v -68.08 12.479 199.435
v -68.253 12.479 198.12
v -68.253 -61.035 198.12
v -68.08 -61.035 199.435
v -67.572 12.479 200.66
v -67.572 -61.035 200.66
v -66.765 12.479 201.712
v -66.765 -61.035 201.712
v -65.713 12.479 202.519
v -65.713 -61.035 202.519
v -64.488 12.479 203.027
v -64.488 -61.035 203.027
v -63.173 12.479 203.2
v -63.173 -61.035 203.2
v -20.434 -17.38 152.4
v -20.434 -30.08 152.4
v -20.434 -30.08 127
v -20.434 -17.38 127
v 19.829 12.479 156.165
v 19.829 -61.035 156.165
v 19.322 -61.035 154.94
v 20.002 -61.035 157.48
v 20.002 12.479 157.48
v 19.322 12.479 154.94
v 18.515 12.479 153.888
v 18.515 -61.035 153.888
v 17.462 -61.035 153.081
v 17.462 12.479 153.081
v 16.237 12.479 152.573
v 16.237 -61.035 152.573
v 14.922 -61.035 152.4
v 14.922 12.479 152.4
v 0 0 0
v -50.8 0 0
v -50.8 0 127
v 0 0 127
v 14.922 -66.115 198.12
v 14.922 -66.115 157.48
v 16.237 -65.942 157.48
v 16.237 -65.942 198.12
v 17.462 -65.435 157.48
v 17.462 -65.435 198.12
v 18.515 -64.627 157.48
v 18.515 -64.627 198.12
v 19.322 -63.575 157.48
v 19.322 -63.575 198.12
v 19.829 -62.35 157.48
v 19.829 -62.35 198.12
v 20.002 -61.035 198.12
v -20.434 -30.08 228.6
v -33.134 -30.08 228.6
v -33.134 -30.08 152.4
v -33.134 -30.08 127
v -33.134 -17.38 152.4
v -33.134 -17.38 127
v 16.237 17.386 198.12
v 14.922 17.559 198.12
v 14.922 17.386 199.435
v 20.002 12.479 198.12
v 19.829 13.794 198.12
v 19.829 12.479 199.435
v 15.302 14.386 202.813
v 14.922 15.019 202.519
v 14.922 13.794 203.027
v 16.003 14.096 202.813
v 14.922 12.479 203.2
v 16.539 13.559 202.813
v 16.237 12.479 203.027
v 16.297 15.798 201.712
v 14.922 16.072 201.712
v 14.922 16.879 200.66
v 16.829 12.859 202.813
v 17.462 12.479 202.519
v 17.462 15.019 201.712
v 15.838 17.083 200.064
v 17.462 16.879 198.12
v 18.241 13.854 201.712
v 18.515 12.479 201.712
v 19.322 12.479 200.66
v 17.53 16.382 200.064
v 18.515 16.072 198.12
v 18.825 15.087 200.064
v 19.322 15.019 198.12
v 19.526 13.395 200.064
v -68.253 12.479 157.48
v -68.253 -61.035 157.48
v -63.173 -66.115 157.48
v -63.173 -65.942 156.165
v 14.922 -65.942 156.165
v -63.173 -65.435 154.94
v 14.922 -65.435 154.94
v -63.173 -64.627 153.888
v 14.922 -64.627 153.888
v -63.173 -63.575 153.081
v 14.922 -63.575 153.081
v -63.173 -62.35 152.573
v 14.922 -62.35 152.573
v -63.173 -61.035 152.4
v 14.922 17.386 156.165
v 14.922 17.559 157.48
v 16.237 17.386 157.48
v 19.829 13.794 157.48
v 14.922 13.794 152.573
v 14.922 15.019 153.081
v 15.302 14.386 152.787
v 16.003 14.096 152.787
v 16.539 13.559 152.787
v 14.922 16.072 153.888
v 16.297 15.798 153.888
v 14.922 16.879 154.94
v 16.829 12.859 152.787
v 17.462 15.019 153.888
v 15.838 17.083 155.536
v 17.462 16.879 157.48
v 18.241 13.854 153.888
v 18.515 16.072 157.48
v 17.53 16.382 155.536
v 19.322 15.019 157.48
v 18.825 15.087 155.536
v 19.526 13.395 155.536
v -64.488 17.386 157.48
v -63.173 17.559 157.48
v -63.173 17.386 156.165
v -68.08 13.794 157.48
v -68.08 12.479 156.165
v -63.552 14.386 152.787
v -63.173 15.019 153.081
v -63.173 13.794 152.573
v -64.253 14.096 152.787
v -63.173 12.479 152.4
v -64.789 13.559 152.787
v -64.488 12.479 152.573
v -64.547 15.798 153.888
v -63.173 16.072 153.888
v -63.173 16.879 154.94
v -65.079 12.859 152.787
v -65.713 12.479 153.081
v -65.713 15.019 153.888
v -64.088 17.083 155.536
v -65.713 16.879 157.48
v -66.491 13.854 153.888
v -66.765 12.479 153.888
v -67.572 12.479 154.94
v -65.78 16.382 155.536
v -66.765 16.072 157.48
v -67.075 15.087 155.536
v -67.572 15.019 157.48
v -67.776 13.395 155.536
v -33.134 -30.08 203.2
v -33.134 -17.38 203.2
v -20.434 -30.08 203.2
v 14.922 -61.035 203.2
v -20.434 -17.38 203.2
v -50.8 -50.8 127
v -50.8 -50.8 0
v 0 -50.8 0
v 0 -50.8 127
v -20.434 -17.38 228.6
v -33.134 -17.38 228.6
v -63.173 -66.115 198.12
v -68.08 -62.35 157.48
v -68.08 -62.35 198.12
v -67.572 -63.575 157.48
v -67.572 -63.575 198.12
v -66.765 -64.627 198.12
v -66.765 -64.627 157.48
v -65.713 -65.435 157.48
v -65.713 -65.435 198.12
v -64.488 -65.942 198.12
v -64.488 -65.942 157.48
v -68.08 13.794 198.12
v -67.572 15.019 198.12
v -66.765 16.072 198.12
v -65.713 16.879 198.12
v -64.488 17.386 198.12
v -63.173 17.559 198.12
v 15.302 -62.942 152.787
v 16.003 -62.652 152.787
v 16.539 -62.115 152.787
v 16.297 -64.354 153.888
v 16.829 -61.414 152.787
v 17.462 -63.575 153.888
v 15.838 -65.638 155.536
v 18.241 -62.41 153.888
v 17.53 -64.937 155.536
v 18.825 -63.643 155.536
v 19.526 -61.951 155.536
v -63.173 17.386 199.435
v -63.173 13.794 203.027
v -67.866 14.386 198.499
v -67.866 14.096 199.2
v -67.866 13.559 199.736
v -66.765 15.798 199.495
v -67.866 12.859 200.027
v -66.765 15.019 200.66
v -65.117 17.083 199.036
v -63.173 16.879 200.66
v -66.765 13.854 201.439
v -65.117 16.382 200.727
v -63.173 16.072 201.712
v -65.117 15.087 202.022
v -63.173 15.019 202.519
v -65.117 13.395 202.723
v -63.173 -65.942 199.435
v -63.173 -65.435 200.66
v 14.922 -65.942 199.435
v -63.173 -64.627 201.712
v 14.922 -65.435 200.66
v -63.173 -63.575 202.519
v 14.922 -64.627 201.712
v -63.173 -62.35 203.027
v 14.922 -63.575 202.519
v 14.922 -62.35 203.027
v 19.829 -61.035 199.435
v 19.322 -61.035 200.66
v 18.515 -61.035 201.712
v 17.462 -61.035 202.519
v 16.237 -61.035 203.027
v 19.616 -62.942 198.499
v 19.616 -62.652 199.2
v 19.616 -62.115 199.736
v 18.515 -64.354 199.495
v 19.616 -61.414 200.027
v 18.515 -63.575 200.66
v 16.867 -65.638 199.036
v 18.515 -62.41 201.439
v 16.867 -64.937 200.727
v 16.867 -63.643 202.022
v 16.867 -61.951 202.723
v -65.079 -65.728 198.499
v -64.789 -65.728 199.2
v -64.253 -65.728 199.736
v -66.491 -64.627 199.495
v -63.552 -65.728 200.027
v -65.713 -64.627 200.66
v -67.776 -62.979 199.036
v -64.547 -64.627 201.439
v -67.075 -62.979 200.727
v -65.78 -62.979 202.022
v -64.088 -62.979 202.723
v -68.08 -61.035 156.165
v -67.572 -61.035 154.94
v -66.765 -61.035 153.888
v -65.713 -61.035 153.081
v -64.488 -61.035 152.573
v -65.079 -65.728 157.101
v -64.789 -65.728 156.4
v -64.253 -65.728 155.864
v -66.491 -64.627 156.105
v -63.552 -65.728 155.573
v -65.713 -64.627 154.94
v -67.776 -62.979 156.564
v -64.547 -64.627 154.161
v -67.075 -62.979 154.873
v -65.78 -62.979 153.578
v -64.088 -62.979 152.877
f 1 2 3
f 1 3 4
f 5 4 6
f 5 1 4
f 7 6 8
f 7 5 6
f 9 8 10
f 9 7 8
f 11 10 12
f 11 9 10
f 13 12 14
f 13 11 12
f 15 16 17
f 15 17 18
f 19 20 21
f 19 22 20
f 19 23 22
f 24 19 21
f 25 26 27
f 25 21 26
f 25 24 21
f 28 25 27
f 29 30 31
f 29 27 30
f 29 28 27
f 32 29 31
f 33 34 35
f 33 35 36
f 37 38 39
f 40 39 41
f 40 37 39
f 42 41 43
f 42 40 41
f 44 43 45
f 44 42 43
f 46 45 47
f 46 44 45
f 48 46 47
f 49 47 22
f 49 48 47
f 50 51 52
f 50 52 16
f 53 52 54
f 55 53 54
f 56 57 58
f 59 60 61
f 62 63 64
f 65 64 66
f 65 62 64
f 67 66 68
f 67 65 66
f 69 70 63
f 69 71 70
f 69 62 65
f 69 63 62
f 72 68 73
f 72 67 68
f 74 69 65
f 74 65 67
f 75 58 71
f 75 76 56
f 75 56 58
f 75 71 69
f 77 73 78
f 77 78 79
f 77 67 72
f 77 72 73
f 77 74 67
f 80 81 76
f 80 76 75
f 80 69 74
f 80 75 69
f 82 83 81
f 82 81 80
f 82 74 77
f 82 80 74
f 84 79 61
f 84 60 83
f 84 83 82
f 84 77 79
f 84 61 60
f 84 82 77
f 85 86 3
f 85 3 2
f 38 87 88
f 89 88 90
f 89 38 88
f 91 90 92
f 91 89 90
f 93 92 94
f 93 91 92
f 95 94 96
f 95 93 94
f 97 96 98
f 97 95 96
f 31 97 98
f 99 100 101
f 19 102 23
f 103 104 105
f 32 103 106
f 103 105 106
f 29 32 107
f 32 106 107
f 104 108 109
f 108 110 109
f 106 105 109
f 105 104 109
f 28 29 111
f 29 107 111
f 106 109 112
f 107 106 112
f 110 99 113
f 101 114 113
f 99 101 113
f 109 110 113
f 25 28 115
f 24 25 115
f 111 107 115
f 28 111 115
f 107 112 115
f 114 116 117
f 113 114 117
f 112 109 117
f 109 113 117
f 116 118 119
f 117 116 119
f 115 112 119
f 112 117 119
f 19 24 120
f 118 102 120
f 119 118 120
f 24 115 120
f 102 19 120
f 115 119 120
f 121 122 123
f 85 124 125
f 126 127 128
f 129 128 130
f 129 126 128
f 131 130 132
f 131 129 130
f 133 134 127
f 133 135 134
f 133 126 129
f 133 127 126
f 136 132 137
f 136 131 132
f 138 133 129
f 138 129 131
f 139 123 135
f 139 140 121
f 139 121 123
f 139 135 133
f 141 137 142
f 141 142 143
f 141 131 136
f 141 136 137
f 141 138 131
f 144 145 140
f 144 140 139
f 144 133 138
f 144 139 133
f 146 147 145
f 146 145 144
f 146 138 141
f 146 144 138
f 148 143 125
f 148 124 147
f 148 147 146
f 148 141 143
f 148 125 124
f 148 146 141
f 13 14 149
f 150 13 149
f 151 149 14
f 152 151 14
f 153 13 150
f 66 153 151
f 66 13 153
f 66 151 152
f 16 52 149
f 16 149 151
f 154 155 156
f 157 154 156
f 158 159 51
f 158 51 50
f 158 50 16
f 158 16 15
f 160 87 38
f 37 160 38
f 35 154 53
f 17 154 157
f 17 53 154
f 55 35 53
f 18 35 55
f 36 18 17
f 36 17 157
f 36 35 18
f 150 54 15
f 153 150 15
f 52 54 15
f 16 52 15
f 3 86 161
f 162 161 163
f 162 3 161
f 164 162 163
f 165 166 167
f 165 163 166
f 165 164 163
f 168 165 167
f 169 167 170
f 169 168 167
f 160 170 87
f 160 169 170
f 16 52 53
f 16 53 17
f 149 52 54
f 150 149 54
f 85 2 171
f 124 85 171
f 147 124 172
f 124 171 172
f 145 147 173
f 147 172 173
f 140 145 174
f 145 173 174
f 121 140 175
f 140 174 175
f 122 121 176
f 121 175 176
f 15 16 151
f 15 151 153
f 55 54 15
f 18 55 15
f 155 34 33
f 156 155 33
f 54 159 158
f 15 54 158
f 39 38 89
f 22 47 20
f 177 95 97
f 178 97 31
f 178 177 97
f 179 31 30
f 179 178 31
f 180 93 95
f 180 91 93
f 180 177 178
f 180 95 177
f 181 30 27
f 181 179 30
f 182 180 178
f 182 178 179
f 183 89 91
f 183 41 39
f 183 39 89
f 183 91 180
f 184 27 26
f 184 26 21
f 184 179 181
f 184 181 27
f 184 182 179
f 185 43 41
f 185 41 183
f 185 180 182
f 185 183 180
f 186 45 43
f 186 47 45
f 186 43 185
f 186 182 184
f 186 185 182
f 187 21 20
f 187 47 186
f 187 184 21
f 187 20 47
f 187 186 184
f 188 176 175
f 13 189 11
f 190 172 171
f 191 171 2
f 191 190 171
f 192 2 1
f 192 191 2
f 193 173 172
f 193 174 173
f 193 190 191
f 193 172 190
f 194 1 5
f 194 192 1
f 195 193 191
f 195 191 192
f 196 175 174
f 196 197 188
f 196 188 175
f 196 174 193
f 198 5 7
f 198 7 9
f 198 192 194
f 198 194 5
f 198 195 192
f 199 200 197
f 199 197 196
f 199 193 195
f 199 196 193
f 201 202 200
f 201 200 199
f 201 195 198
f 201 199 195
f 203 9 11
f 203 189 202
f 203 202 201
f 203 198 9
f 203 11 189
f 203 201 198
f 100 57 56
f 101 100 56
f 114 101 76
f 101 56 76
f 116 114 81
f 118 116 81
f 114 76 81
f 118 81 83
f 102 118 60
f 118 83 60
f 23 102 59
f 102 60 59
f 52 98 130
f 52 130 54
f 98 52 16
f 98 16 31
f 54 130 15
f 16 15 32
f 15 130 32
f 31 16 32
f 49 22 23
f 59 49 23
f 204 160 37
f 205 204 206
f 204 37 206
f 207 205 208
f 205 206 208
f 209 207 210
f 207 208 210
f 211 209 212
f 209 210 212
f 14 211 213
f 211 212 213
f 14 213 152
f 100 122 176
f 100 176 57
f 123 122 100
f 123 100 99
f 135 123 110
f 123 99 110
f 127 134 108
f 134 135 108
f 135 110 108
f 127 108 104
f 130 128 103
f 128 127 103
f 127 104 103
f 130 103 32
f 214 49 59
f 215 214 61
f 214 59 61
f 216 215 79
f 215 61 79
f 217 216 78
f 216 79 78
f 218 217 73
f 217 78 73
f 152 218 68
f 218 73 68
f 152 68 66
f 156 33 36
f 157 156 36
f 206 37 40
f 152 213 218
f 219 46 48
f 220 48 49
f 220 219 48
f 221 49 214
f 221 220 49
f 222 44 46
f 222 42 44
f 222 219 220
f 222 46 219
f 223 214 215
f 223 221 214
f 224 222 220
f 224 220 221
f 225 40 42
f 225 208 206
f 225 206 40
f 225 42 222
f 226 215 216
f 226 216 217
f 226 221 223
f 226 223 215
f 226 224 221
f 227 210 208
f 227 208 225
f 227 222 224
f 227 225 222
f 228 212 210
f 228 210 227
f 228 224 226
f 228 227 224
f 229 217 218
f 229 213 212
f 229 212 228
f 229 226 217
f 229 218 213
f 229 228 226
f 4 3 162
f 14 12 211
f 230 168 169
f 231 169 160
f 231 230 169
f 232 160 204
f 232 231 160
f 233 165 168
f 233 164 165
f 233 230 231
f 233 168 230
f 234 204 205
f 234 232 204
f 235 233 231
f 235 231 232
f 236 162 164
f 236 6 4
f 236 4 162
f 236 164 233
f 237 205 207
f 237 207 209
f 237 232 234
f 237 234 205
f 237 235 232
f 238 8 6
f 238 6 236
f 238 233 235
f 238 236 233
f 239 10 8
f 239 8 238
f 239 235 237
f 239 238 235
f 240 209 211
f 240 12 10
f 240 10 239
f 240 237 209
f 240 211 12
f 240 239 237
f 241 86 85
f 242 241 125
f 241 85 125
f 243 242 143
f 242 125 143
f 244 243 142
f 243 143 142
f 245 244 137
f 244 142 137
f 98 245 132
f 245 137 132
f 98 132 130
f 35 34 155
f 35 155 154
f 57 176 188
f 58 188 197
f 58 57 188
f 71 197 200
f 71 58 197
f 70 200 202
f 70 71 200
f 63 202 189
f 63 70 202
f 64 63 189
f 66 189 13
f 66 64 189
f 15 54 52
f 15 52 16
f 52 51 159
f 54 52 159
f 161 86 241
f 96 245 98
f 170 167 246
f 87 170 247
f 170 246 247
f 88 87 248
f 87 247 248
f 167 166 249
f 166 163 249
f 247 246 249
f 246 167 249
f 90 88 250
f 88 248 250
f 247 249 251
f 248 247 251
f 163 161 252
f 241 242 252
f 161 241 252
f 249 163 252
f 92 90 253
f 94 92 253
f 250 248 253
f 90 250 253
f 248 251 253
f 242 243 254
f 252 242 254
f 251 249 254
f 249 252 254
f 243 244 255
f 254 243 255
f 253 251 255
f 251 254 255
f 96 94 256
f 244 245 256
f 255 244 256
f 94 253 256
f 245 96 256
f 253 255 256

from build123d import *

# Parameters (mm, degrees)
F0_W      = 50.8
F0_H      = 127
F1_DEPTH  = 50.8
F2_W      = 12.7
F2_H      = 12.7
F3_DEPTH  = 25.4
F4_W      = 88.255308
F4_H      = 83.674579
F4_W_2    = 12.7
F4_H_2    = 12.7
F5_DEPTH  = 50.8
F3_FACE_W = 12.7
F3_FACE_H = 12.7
F6_DEPTH  = 76.2
F7_R      = 5.08


with BuildPart() as f1:
    # F0 (on Front) → F1 (new body)
    with BuildSketch(Plane.XZ):
        with Locations((-25.4, 63.5)):
            Rectangle(F0_W, F0_H)
    extrude(amount=F1_DEPTH)

    # F2 (on face) → F3 (join)
    with BuildSketch(Plane.XY.offset(127)):
        with Locations((-26.783913, -23.730097)):
            Rectangle(F2_W, F2_H)
    extrude(amount=F3_DEPTH)


with BuildPart() as f5:
    # F4 (on face) → F5 (new body)
    with BuildSketch(Plane.XY.offset(152.4)):
        with Locations((-24.125155, -24.277844)):
            Rectangle(F4_W, F4_H)
        with Locations((-26.783913, -23.730097)):
            Rectangle(F4_W_2, F4_H_2, mode=Mode.SUBTRACT)
    extrude(amount=F5_DEPTH)

    # F7
    f7_edges = [f5.edges().sort_by_distance(p)[0] for p in [
        (20.002499, 17.559446, 177.8),
        (-24.125155, 17.559446, 203.2),
        (-68.252809, 17.559446, 177.8),
        (-24.125155, 17.559446, 152.4),
        (-68.252809, -24.277844, 203.2),
        (-68.252809, -24.277844, 152.4),
        (-68.252809, -66.115133, 177.8),
        (-24.125155, -66.115133, 203.2),
        (20.002499, -66.115133, 177.8),
        (-24.125155, -66.115133, 152.4),
        (20.002499, -24.277844, 203.2),
        (20.002499, -24.277844, 152.4),
    ]]
    fillet(f7_edges, radius=F7_R)


with BuildPart() as f6:
    # F3_face (on face) → F6 (new body)
    with BuildSketch(Plane(origin=(-26.783913, -23.730097, 152.4), x_dir=(1, 0, 0), z_dir=(0, 0, 1))):
        Rectangle(F3_FACE_W, F3_FACE_H)
    extrude(amount=F6_DEPTH)


solid = Compound([f1.part, f5.part, f6.part])
